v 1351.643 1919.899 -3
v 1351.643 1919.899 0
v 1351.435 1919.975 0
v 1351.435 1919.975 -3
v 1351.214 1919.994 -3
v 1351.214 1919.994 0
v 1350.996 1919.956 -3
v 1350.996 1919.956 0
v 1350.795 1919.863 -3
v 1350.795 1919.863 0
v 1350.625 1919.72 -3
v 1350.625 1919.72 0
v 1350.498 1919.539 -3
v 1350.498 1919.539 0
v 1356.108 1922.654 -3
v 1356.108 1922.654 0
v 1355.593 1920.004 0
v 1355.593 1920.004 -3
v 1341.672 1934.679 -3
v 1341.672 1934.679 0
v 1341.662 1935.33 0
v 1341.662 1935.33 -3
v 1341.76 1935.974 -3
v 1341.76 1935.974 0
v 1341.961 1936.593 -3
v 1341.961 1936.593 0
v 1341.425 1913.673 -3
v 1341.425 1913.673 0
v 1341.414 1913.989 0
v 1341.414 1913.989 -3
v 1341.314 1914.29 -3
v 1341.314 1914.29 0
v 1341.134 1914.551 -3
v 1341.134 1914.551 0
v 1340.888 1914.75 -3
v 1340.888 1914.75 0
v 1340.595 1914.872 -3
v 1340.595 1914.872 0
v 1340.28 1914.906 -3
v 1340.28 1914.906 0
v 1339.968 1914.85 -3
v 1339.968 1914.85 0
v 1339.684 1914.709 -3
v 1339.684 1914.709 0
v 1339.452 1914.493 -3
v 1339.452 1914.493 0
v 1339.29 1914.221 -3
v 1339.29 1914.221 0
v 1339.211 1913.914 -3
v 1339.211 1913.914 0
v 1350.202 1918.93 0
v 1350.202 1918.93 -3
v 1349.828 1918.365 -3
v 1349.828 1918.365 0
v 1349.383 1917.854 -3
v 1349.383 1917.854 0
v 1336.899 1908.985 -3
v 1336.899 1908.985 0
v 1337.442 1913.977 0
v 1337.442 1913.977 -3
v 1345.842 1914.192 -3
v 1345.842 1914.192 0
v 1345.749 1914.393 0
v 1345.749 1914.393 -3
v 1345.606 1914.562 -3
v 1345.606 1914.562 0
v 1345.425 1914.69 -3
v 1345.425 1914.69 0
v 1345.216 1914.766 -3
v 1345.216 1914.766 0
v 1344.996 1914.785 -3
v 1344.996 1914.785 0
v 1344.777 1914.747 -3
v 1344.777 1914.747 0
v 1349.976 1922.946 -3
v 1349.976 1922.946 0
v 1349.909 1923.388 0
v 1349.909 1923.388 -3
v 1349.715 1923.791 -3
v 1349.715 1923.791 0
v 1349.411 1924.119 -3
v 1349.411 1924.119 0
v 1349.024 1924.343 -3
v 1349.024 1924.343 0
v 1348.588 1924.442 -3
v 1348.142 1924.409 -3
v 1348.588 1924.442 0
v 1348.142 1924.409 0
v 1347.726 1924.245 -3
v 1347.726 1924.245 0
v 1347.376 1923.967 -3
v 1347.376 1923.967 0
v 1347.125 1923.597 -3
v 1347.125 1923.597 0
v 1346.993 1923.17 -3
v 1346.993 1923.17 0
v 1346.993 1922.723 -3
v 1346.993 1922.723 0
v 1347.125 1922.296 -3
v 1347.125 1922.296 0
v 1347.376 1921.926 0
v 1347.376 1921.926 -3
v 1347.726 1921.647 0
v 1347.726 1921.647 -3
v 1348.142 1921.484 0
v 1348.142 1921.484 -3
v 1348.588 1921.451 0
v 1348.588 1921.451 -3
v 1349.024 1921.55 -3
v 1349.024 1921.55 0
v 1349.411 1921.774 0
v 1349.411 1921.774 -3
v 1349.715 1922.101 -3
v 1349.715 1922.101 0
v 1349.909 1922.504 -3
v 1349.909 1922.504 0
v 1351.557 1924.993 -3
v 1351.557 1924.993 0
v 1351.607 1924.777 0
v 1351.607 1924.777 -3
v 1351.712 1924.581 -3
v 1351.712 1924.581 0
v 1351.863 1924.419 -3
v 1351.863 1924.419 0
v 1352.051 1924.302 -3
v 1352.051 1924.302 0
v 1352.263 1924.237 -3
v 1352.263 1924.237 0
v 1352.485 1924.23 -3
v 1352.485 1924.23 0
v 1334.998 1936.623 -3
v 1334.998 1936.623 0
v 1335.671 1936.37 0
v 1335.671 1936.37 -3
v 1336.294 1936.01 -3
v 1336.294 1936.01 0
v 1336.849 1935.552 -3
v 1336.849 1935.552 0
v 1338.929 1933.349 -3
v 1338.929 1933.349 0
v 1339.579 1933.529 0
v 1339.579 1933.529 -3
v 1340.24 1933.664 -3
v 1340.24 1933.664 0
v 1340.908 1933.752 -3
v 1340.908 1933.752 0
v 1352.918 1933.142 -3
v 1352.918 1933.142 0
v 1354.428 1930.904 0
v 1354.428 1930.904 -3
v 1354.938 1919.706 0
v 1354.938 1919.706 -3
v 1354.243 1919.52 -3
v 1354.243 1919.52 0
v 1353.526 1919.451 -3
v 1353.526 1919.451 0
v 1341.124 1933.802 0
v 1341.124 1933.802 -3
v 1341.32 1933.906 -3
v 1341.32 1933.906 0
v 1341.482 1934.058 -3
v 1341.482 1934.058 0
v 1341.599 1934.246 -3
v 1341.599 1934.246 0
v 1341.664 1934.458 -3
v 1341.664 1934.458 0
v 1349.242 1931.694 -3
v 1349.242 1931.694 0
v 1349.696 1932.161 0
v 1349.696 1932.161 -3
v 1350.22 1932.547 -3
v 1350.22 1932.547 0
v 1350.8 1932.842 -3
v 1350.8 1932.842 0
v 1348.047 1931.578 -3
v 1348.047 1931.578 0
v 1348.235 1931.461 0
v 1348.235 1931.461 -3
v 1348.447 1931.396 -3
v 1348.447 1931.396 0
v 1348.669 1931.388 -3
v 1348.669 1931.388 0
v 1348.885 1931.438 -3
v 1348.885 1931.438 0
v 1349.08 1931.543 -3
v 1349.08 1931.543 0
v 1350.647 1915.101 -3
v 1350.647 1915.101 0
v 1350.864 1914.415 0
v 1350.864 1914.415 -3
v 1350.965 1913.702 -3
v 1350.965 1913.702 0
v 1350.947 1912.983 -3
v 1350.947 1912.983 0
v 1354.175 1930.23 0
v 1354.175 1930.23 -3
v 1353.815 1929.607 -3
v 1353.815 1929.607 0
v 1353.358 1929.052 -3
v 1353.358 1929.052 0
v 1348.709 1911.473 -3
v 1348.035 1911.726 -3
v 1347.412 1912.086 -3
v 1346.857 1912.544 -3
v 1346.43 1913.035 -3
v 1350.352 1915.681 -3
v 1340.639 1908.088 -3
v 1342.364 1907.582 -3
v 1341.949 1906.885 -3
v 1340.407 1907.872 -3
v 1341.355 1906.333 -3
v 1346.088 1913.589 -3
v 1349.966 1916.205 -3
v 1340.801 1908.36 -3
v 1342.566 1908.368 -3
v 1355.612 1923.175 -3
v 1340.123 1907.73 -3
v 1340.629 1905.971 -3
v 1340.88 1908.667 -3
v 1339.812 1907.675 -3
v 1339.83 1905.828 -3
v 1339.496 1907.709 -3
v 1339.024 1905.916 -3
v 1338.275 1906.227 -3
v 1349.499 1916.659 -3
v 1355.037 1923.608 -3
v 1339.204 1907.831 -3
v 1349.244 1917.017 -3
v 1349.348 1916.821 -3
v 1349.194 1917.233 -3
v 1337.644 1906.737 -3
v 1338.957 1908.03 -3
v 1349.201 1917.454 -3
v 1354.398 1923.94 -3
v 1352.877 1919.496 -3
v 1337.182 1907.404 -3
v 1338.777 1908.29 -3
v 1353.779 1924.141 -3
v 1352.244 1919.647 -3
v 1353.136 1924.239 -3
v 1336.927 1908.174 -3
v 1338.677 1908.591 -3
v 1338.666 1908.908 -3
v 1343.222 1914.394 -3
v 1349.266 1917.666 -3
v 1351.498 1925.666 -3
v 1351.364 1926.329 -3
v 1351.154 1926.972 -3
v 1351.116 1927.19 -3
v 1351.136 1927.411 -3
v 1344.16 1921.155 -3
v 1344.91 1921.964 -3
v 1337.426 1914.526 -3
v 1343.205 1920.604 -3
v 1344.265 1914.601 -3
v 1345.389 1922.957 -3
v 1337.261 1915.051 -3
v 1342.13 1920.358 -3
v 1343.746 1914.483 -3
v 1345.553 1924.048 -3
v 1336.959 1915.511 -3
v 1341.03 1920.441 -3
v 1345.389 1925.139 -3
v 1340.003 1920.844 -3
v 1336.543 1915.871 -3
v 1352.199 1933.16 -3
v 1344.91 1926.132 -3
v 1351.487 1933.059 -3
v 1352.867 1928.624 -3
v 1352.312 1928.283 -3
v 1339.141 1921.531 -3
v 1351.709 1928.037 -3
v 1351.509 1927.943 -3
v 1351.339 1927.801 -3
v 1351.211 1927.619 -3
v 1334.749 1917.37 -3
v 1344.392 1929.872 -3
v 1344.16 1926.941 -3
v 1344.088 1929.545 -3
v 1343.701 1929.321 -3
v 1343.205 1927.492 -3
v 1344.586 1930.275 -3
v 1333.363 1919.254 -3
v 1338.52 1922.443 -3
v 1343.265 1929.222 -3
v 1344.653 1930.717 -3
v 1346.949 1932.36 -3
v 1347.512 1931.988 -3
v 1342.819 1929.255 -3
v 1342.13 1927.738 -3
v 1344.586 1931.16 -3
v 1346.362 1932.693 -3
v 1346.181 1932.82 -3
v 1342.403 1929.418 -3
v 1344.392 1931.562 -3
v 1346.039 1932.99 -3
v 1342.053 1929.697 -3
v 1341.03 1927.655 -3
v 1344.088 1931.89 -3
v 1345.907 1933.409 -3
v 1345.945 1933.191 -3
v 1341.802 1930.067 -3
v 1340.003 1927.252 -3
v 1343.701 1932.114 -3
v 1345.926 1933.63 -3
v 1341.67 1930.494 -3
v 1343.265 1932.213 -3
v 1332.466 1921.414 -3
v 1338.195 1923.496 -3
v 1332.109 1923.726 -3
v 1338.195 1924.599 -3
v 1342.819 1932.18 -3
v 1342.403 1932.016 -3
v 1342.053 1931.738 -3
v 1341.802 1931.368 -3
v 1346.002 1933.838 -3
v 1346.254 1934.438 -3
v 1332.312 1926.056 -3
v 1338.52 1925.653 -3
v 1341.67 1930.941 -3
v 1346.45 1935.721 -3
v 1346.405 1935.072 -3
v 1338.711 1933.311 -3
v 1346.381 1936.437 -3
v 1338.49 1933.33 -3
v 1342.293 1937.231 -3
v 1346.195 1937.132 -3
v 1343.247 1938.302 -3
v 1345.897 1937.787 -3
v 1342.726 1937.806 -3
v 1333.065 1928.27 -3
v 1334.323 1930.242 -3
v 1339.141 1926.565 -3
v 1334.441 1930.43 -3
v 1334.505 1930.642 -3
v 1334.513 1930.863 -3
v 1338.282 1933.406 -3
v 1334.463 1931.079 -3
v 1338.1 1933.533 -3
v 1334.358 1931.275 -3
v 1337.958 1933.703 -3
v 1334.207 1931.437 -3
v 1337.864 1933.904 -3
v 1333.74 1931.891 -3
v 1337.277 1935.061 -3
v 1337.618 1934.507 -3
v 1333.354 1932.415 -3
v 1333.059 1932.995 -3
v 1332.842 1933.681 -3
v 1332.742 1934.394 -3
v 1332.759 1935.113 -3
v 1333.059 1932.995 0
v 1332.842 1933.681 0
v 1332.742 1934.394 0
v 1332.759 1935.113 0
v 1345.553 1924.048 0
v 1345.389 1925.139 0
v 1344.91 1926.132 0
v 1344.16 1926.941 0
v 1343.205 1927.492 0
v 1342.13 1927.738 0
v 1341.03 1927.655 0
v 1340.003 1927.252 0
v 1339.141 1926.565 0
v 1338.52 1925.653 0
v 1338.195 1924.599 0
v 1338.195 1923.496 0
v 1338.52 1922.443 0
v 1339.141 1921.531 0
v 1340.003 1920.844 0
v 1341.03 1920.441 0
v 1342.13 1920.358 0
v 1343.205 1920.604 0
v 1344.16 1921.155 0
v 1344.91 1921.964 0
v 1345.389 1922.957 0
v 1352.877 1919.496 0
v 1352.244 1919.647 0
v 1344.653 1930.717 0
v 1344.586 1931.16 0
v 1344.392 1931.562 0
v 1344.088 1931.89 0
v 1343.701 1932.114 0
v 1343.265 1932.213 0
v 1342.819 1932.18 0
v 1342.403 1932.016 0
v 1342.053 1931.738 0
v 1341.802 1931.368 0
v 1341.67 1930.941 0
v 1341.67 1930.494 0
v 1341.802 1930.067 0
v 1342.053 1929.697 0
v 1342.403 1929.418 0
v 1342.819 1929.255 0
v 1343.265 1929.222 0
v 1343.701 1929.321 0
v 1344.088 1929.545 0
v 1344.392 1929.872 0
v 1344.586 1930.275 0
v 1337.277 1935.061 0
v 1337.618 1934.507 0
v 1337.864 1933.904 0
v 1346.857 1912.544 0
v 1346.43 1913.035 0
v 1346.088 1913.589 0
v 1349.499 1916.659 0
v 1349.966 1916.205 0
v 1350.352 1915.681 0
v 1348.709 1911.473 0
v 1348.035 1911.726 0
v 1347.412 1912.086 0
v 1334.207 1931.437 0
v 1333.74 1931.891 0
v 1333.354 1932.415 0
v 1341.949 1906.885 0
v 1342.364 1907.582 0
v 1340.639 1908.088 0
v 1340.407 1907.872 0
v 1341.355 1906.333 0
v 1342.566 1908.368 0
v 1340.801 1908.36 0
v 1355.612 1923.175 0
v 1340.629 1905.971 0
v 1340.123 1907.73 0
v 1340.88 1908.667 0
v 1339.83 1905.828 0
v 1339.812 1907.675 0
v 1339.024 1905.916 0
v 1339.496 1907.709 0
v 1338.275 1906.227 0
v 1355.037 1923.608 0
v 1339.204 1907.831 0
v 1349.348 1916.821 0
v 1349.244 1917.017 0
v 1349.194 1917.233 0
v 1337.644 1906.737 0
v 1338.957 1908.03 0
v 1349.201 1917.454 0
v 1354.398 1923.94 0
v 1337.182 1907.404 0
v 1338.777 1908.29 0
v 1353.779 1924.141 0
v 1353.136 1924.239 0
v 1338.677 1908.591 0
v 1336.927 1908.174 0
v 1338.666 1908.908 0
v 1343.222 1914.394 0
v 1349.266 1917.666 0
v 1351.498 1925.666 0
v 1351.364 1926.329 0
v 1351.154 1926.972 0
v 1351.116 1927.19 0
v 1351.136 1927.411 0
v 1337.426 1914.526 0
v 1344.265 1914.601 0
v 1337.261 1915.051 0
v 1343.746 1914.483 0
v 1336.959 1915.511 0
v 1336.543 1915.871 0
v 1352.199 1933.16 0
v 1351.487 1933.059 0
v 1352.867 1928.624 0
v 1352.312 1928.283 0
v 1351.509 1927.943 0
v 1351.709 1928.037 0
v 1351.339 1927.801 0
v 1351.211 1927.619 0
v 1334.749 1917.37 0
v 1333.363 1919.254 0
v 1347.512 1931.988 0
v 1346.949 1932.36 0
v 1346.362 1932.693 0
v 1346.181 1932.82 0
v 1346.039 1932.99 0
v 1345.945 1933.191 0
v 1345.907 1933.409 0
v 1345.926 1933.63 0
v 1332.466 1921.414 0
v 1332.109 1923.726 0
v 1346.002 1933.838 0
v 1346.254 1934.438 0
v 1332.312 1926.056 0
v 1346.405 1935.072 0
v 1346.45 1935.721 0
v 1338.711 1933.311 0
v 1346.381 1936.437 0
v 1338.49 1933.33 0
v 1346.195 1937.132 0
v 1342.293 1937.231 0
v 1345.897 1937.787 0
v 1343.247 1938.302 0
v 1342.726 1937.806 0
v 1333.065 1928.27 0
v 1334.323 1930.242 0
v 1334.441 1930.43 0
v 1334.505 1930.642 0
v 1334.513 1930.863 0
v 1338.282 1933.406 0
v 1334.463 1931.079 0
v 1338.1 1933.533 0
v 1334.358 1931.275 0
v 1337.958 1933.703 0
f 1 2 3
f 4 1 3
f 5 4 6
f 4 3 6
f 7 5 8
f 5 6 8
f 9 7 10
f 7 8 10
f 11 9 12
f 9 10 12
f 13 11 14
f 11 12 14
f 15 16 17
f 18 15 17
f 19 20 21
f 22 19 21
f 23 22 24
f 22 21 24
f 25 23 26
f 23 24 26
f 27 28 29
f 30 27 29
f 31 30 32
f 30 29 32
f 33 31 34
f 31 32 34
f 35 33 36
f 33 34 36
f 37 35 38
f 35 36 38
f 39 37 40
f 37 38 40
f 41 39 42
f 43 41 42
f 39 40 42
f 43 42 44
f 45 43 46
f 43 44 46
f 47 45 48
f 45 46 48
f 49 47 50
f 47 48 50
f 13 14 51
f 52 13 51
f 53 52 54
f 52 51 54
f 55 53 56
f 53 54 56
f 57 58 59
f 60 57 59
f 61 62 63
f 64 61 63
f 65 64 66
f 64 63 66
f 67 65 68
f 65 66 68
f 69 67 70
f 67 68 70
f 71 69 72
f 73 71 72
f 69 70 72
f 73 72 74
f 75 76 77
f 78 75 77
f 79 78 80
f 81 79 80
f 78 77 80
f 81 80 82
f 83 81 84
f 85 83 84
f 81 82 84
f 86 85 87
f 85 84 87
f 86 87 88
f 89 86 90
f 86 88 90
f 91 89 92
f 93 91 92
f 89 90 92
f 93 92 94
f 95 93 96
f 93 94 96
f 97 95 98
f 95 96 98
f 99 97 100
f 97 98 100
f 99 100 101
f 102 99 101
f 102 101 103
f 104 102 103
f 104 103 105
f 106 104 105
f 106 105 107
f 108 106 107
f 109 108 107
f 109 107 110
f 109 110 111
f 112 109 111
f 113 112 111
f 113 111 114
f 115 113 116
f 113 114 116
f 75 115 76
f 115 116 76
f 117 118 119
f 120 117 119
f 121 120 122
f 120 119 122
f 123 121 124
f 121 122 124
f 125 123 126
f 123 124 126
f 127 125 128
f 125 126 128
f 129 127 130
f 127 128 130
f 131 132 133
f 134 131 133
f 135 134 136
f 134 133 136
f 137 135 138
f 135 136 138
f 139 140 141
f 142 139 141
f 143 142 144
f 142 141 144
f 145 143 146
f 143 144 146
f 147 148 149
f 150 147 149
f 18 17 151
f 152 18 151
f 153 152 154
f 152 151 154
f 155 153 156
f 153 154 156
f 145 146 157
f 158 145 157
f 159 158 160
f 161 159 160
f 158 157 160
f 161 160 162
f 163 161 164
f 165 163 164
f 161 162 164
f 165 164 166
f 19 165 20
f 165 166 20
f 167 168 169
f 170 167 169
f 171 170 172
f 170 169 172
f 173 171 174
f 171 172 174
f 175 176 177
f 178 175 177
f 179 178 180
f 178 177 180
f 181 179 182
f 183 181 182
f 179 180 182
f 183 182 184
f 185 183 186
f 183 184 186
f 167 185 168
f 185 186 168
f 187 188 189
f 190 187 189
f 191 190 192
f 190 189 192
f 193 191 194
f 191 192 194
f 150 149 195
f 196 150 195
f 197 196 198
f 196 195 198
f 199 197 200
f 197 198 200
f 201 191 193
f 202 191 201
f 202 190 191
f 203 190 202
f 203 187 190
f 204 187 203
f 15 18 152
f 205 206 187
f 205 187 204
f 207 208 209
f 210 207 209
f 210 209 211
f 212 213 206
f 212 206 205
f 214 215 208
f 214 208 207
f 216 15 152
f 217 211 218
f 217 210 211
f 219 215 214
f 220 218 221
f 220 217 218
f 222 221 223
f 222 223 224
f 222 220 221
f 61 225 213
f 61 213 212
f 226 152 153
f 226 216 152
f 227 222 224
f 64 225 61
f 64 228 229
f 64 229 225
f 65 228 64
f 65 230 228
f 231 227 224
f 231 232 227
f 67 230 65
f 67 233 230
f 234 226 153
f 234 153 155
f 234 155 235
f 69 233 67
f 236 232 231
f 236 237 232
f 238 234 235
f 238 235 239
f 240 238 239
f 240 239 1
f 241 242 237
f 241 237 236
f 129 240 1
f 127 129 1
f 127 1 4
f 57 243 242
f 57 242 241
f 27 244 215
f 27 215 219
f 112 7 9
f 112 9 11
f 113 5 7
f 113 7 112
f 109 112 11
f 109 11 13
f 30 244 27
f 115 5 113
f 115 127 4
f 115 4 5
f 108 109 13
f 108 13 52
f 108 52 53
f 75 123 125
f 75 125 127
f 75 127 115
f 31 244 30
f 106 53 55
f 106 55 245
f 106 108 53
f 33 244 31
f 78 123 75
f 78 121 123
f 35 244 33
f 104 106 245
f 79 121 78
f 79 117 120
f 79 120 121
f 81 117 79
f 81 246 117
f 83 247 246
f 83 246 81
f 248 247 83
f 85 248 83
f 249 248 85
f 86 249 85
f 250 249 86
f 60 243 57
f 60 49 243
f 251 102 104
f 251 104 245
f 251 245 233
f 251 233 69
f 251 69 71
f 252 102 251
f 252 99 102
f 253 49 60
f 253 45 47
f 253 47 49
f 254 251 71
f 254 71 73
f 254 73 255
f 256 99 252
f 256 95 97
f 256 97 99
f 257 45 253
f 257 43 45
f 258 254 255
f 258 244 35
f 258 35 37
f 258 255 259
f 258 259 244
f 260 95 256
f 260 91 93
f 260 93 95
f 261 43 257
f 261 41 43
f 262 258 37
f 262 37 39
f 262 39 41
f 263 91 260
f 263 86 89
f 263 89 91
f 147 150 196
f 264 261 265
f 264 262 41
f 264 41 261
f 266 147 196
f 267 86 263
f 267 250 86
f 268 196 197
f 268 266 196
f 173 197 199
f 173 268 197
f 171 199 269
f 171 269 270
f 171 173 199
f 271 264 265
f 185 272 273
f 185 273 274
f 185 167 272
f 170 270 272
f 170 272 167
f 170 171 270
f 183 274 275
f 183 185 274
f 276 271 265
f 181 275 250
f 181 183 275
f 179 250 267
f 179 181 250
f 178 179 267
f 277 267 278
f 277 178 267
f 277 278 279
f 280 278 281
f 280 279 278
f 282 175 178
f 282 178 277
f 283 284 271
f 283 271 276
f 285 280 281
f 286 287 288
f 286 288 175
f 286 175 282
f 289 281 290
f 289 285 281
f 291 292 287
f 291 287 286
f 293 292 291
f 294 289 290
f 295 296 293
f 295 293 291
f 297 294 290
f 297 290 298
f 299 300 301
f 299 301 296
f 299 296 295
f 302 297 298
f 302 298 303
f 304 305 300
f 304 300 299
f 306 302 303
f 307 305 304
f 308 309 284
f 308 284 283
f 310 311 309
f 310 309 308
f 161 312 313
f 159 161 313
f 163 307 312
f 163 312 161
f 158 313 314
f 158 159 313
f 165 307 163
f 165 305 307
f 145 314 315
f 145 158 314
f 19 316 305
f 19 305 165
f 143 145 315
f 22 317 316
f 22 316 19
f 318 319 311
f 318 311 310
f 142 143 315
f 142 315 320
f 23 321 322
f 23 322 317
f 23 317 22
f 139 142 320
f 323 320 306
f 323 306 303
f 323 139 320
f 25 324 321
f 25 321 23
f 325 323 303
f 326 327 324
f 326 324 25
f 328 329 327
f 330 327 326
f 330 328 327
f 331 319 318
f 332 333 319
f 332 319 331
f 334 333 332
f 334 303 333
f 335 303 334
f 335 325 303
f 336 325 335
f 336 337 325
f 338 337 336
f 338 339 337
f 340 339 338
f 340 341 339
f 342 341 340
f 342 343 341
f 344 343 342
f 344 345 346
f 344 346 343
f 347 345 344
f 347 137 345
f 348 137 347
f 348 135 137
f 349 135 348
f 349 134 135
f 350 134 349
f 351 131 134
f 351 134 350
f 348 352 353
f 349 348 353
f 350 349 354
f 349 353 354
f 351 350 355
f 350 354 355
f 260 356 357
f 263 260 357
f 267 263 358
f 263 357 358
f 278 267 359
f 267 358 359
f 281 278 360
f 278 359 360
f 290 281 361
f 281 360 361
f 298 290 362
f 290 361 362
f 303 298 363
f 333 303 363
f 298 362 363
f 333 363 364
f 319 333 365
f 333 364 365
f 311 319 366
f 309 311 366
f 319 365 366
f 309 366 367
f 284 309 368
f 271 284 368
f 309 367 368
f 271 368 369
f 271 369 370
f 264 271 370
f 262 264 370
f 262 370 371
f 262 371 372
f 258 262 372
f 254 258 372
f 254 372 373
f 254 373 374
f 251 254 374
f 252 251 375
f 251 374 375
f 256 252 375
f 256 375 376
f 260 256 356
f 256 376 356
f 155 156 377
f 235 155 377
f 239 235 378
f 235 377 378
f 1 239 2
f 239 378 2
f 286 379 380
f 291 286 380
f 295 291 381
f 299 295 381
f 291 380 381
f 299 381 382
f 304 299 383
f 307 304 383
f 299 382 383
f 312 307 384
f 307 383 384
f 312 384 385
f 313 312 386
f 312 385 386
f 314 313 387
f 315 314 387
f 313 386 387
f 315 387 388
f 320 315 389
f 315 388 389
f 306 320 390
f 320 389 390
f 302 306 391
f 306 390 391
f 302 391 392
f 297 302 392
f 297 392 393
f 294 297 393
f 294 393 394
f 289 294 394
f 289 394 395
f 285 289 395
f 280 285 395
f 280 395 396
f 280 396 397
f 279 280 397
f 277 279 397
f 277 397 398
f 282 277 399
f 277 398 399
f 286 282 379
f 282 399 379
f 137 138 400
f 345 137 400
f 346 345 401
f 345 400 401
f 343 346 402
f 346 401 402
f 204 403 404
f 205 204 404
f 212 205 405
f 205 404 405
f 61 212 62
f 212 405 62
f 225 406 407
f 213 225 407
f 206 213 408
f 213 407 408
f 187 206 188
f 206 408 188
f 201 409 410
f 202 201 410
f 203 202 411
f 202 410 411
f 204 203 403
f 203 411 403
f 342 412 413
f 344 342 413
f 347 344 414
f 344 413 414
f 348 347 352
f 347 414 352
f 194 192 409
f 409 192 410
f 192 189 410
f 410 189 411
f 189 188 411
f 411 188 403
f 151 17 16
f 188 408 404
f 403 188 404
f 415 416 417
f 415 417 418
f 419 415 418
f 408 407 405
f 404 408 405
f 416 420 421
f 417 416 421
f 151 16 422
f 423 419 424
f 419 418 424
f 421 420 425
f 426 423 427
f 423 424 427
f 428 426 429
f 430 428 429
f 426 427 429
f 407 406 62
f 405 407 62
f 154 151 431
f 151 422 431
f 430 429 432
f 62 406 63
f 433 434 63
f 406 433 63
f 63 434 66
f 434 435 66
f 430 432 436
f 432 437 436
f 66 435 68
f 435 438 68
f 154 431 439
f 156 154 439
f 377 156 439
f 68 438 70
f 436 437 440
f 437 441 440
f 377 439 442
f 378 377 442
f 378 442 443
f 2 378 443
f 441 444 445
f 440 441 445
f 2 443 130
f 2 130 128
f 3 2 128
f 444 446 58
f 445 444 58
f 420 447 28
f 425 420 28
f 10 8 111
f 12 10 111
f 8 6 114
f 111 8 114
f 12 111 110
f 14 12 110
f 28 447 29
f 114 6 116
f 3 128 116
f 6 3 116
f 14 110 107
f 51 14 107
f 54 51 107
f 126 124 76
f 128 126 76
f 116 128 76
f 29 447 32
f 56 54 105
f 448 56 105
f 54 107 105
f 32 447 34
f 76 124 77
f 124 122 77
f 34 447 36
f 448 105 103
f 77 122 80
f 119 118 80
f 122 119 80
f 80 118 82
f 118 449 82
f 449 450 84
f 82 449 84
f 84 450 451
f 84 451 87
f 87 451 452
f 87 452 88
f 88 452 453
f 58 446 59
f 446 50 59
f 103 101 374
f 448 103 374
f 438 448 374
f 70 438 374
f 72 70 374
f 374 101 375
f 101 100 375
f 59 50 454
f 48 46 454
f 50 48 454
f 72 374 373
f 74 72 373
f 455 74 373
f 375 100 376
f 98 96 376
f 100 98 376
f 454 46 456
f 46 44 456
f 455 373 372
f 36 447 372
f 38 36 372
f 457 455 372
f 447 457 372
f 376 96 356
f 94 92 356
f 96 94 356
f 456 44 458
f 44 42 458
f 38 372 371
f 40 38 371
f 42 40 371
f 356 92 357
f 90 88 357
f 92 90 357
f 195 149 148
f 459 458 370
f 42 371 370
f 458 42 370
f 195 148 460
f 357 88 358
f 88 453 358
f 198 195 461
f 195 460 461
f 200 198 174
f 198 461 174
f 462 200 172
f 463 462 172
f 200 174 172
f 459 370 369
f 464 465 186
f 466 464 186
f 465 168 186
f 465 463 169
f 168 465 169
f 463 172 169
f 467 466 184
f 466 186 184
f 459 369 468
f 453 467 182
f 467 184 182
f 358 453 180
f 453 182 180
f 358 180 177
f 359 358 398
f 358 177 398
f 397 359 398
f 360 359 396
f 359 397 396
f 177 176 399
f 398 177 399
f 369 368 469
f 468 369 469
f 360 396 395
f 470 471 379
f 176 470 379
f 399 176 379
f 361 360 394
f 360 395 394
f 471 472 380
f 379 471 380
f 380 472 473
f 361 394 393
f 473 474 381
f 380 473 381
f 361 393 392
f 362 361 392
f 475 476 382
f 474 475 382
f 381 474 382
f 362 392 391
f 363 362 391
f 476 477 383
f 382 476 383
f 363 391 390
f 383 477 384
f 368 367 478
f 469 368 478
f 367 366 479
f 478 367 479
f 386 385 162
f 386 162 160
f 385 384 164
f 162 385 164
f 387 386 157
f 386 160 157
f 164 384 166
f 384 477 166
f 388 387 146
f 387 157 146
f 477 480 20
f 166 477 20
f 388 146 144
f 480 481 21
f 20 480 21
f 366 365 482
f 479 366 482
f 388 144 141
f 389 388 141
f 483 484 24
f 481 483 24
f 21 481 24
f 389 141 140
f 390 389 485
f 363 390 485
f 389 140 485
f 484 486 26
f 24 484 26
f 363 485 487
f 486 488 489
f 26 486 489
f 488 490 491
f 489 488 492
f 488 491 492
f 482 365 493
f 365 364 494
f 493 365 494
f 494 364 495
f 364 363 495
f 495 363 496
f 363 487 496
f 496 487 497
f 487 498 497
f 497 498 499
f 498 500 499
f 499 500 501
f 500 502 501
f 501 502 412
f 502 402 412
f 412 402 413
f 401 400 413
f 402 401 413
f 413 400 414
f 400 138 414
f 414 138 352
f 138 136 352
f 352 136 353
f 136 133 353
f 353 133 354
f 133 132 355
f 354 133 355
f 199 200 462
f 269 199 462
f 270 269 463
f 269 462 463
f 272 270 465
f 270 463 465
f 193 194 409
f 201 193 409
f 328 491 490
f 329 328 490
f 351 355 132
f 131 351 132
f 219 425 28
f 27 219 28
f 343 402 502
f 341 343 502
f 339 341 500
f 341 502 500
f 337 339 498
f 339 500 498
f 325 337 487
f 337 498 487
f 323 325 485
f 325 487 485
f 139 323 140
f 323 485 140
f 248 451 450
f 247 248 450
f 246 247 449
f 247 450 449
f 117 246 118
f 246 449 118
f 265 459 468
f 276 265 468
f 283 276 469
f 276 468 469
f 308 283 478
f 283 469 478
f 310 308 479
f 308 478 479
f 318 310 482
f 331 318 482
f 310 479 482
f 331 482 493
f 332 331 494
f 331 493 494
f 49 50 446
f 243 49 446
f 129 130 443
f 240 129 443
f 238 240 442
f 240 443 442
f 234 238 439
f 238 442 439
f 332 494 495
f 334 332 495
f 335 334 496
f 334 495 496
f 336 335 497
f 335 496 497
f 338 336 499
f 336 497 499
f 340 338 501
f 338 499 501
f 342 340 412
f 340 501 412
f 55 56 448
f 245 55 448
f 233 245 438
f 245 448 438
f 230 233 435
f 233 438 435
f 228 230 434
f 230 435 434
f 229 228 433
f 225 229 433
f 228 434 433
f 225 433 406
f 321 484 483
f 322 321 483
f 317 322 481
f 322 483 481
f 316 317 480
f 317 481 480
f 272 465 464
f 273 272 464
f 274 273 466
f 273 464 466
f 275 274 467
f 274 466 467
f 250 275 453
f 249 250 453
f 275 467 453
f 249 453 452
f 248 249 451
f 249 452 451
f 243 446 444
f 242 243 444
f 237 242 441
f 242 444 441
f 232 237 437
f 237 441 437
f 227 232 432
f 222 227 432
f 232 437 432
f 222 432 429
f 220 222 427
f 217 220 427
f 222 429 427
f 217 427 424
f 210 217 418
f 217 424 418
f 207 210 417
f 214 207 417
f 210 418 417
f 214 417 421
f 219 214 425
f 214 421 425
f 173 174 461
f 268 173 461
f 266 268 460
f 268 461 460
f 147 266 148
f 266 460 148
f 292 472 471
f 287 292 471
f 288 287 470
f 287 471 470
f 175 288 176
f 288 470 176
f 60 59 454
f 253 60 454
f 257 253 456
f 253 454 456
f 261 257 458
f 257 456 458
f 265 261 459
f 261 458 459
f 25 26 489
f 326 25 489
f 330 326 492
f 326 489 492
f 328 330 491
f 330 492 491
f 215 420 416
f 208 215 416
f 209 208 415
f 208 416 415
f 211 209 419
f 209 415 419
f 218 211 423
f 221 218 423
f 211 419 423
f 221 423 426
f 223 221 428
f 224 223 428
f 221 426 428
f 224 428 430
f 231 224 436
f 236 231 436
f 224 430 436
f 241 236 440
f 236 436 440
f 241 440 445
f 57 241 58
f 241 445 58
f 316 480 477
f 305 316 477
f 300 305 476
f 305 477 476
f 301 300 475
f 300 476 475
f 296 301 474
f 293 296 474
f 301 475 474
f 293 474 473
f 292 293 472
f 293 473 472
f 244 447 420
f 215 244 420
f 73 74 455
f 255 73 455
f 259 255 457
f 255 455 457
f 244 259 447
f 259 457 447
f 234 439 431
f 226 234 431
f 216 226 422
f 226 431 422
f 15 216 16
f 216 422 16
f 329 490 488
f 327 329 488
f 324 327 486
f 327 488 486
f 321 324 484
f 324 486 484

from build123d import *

# Parameters (mm, degrees)
ESQUISSE1_R               = 3.7
ESQUISSE1_R_2             = 1.5
T_LE_DE_BASE_PLI_E1_DEPTH = 3


# Sheet-metal steps are written as plain solids
with BuildPart() as part:
    # Esquisse1 → Tôle de base pliée1 (new body)
    with BuildSketch(Plane.XY):
        with BuildLine():
            Line((1343.247008076, 1938.302325501), (1345.89746161, 1937.787450694))
            ThreePointArc((1345.89746161, 1937.787450694), (1346.302249899, 1936.788677026), (1346.449670341, 1935.72112393))
            ThreePointArc((1346.449670341, 1935.72112393), (1346.342555269, 1934.751830987), (1346.001938932, 1933.838056967))
            ThreePointArc((1346.001938932, 1933.838056967), (1345.945060229, 1933.190654063), (1346.362467863, 1932.692520976))
            ThreePointArc((1346.362467863, 1932.692520976), (1347.233633787, 1932.178943437), (1348.046916436, 1931.57789162))
            ThreePointArc((1348.046916436, 1931.57789162), (1348.668588775, 1931.388447146), (1349.242230693, 1931.693898708))
            ThreePointArc((1349.242230693, 1931.693898708), (1349.950118086, 1932.364642987), (1350.800392256, 1932.842174436))
            ThreePointArc((1350.800392256, 1932.842174436), (1351.840616067, 1933.123842365), (1352.918151311, 1933.141736383))
            Line((1352.918151311, 1933.141736383), (1354.428233511, 1930.903511249))
            ThreePointArc((1354.428233511, 1930.903511249), (1354.008222422, 1929.911043071), (1353.357590382, 1929.051927044))
            ThreePointArc((1353.357590382, 1929.051927044), (1352.596454976, 1928.442275224), (1351.709467048, 1928.03699154))
            ThreePointArc((1351.709467048, 1928.03699154), (1351.211464748, 1927.619427873), (1351.154383232, 1926.97204282))
            ThreePointArc((1351.154383232, 1926.97204282), (1351.440459119, 1925.999644606), (1351.557306264, 1924.992795836))
            ThreePointArc((1351.557306264, 1924.992795836), (1351.862937519, 1924.419249637), (1352.48455048, 1924.229610418))
            ThreePointArc((1352.48455048, 1924.229610418), (1353.459390284, 1924.203346271), (1354.398290641, 1923.939777365))
            ThreePointArc((1354.398290641, 1923.939777365), (1355.333009255, 1923.403397357), (1356.107594714, 1922.65411786))
            Line((1356.107594714, 1922.65411786), (1355.592719908, 1920.003664327))
            ThreePointArc((1355.592719908, 1920.003664327), (1354.59394624, 1919.598876037), (1353.526393144, 1919.451455596))
            ThreePointArc((1353.526393144, 1919.451455596), (1352.557100201, 1919.558570667), (1351.643326181, 1919.899187005))
            ThreePointArc((1351.643326181, 1919.899187005), (1350.995923277, 1919.956065707), (1350.497790189, 1919.538658073))
            ThreePointArc((1350.497790189, 1919.538658073), (1350.024286618, 1918.640974498), (1349.383160833, 1917.854209501))
            ThreePointArc((1349.383160833, 1917.854209501), (1349.19371636, 1917.232537161), (1349.499167922, 1916.658895244))
            ThreePointArc((1349.499167922, 1916.658895244), (1350.169912201, 1915.951007851), (1350.64744365, 1915.100733681))
            ThreePointArc((1350.64744365, 1915.100733681), (1350.929111579, 1914.06050987), (1350.947005597, 1912.982974625))
            Line((1350.947005597, 1912.982974625), (1348.708780463, 1911.472892426))
            ThreePointArc((1348.708780463, 1911.472892426), (1347.716312285, 1911.892903515), (1346.857196258, 1912.543535554))
            ThreePointArc((1346.857196258, 1912.543535554), (1346.247544438, 1913.304670961), (1345.842260754, 1914.191658889))
            ThreePointArc((1345.842260754, 1914.191658889), (1345.424697087, 1914.689661189), (1344.777312034, 1914.746742704))
            ThreePointArc((1344.777312034, 1914.746742704), (1344.006653047, 1914.538715485), (1343.221559749, 1914.394427185))
            Line((1343.221559749, 1914.394427185), (1342.565641761, 1908.368090699))
            ThreePointArc((1342.565641761, 1908.368090699), (1339.42399637, 1905.843201744), (1336.899107414, 1908.984847135))
            Line((1336.899107414, 1908.984847135), (1337.442443377, 1913.976820816))
            ThreePointArc((1337.442443377, 1913.976820816), (1337.260922483, 1915.05095745), (1336.54337922, 1915.870622631))
            ThreePointArc((1336.54337922, 1915.870622631), (1332.217504298, 1922.559333364), (1334.323234317, 1930.241647222))
            ThreePointArc((1334.323234317, 1930.241647222), (1334.51267879, 1930.863319562), (1334.207227229, 1931.436961479))
            ThreePointArc((1334.207227229, 1931.436961479), (1333.536482949, 1932.144848872), (1333.0589515, 1932.995123042))
            ThreePointArc((1333.0589515, 1932.995123042), (1332.777283571, 1934.035346853), (1332.759389553, 1935.112882097))
            Line((1332.759389553, 1935.112882097), (1334.997614687, 1936.622964297))
            ThreePointArc((1334.997614687, 1936.622964297), (1335.990082865, 1936.202953208), (1336.849198892, 1935.552321168))
            ThreePointArc((1336.849198892, 1935.552321168), (1337.458850712, 1934.791185762), (1337.864134396, 1933.904197834))
            ThreePointArc((1337.864134396, 1933.904197834), (1338.281698063, 1933.406195534), (1338.929083116, 1933.349114018))
            ThreePointArc((1338.929083116, 1933.349114018), (1339.908244608, 1933.601967191), (1340.9083301, 1933.752037051))
            ThreePointArc((1340.9083301, 1933.752037051), (1341.481876299, 1934.057668306), (1341.671515518, 1934.679281266))
            ThreePointArc((1341.671515518, 1934.679281266), (1341.697779666, 1935.65412107), (1341.961348571, 1936.593021428))
            ThreePointArc((1341.961348571, 1936.593021428), (1342.497728579, 1937.527740041), (1343.247008076, 1938.302325501))
        make_face()
        with Locations((1341.853197575, 1924.047928361)):
            Circle(ESQUISSE1_R, mode=Mode.SUBTRACT)
        with Locations((1343.153024926, 1930.717446866)):
            Circle(ESQUISSE1_R_2, mode=Mode.SUBTRACT)
        with Locations((1348.476026591, 1922.946328291)):
            Circle(ESQUISSE1_R_2, mode=Mode.SUBTRACT)
        with BuildLine():
            Line((1340.880246952, 1908.666985015), (1341.425079269, 1913.672706653))
            ThreePointArc((1341.425079269, 1913.672706653), (1340.438549544, 1914.900216702), (1339.211039495, 1913.913686977))
            Line((1339.211039495, 1913.913686977), (1338.666207179, 1908.907965339))
            ThreePointArc((1338.666207179, 1908.907965339), (1339.652736904, 1907.68045529), (1340.880246952, 1908.666985015))
        make_face(mode=Mode.SUBTRACT)
    extrude(amount=-T_LE_DE_BASE_PLI_E1_DEPTH)


solid = part.part
